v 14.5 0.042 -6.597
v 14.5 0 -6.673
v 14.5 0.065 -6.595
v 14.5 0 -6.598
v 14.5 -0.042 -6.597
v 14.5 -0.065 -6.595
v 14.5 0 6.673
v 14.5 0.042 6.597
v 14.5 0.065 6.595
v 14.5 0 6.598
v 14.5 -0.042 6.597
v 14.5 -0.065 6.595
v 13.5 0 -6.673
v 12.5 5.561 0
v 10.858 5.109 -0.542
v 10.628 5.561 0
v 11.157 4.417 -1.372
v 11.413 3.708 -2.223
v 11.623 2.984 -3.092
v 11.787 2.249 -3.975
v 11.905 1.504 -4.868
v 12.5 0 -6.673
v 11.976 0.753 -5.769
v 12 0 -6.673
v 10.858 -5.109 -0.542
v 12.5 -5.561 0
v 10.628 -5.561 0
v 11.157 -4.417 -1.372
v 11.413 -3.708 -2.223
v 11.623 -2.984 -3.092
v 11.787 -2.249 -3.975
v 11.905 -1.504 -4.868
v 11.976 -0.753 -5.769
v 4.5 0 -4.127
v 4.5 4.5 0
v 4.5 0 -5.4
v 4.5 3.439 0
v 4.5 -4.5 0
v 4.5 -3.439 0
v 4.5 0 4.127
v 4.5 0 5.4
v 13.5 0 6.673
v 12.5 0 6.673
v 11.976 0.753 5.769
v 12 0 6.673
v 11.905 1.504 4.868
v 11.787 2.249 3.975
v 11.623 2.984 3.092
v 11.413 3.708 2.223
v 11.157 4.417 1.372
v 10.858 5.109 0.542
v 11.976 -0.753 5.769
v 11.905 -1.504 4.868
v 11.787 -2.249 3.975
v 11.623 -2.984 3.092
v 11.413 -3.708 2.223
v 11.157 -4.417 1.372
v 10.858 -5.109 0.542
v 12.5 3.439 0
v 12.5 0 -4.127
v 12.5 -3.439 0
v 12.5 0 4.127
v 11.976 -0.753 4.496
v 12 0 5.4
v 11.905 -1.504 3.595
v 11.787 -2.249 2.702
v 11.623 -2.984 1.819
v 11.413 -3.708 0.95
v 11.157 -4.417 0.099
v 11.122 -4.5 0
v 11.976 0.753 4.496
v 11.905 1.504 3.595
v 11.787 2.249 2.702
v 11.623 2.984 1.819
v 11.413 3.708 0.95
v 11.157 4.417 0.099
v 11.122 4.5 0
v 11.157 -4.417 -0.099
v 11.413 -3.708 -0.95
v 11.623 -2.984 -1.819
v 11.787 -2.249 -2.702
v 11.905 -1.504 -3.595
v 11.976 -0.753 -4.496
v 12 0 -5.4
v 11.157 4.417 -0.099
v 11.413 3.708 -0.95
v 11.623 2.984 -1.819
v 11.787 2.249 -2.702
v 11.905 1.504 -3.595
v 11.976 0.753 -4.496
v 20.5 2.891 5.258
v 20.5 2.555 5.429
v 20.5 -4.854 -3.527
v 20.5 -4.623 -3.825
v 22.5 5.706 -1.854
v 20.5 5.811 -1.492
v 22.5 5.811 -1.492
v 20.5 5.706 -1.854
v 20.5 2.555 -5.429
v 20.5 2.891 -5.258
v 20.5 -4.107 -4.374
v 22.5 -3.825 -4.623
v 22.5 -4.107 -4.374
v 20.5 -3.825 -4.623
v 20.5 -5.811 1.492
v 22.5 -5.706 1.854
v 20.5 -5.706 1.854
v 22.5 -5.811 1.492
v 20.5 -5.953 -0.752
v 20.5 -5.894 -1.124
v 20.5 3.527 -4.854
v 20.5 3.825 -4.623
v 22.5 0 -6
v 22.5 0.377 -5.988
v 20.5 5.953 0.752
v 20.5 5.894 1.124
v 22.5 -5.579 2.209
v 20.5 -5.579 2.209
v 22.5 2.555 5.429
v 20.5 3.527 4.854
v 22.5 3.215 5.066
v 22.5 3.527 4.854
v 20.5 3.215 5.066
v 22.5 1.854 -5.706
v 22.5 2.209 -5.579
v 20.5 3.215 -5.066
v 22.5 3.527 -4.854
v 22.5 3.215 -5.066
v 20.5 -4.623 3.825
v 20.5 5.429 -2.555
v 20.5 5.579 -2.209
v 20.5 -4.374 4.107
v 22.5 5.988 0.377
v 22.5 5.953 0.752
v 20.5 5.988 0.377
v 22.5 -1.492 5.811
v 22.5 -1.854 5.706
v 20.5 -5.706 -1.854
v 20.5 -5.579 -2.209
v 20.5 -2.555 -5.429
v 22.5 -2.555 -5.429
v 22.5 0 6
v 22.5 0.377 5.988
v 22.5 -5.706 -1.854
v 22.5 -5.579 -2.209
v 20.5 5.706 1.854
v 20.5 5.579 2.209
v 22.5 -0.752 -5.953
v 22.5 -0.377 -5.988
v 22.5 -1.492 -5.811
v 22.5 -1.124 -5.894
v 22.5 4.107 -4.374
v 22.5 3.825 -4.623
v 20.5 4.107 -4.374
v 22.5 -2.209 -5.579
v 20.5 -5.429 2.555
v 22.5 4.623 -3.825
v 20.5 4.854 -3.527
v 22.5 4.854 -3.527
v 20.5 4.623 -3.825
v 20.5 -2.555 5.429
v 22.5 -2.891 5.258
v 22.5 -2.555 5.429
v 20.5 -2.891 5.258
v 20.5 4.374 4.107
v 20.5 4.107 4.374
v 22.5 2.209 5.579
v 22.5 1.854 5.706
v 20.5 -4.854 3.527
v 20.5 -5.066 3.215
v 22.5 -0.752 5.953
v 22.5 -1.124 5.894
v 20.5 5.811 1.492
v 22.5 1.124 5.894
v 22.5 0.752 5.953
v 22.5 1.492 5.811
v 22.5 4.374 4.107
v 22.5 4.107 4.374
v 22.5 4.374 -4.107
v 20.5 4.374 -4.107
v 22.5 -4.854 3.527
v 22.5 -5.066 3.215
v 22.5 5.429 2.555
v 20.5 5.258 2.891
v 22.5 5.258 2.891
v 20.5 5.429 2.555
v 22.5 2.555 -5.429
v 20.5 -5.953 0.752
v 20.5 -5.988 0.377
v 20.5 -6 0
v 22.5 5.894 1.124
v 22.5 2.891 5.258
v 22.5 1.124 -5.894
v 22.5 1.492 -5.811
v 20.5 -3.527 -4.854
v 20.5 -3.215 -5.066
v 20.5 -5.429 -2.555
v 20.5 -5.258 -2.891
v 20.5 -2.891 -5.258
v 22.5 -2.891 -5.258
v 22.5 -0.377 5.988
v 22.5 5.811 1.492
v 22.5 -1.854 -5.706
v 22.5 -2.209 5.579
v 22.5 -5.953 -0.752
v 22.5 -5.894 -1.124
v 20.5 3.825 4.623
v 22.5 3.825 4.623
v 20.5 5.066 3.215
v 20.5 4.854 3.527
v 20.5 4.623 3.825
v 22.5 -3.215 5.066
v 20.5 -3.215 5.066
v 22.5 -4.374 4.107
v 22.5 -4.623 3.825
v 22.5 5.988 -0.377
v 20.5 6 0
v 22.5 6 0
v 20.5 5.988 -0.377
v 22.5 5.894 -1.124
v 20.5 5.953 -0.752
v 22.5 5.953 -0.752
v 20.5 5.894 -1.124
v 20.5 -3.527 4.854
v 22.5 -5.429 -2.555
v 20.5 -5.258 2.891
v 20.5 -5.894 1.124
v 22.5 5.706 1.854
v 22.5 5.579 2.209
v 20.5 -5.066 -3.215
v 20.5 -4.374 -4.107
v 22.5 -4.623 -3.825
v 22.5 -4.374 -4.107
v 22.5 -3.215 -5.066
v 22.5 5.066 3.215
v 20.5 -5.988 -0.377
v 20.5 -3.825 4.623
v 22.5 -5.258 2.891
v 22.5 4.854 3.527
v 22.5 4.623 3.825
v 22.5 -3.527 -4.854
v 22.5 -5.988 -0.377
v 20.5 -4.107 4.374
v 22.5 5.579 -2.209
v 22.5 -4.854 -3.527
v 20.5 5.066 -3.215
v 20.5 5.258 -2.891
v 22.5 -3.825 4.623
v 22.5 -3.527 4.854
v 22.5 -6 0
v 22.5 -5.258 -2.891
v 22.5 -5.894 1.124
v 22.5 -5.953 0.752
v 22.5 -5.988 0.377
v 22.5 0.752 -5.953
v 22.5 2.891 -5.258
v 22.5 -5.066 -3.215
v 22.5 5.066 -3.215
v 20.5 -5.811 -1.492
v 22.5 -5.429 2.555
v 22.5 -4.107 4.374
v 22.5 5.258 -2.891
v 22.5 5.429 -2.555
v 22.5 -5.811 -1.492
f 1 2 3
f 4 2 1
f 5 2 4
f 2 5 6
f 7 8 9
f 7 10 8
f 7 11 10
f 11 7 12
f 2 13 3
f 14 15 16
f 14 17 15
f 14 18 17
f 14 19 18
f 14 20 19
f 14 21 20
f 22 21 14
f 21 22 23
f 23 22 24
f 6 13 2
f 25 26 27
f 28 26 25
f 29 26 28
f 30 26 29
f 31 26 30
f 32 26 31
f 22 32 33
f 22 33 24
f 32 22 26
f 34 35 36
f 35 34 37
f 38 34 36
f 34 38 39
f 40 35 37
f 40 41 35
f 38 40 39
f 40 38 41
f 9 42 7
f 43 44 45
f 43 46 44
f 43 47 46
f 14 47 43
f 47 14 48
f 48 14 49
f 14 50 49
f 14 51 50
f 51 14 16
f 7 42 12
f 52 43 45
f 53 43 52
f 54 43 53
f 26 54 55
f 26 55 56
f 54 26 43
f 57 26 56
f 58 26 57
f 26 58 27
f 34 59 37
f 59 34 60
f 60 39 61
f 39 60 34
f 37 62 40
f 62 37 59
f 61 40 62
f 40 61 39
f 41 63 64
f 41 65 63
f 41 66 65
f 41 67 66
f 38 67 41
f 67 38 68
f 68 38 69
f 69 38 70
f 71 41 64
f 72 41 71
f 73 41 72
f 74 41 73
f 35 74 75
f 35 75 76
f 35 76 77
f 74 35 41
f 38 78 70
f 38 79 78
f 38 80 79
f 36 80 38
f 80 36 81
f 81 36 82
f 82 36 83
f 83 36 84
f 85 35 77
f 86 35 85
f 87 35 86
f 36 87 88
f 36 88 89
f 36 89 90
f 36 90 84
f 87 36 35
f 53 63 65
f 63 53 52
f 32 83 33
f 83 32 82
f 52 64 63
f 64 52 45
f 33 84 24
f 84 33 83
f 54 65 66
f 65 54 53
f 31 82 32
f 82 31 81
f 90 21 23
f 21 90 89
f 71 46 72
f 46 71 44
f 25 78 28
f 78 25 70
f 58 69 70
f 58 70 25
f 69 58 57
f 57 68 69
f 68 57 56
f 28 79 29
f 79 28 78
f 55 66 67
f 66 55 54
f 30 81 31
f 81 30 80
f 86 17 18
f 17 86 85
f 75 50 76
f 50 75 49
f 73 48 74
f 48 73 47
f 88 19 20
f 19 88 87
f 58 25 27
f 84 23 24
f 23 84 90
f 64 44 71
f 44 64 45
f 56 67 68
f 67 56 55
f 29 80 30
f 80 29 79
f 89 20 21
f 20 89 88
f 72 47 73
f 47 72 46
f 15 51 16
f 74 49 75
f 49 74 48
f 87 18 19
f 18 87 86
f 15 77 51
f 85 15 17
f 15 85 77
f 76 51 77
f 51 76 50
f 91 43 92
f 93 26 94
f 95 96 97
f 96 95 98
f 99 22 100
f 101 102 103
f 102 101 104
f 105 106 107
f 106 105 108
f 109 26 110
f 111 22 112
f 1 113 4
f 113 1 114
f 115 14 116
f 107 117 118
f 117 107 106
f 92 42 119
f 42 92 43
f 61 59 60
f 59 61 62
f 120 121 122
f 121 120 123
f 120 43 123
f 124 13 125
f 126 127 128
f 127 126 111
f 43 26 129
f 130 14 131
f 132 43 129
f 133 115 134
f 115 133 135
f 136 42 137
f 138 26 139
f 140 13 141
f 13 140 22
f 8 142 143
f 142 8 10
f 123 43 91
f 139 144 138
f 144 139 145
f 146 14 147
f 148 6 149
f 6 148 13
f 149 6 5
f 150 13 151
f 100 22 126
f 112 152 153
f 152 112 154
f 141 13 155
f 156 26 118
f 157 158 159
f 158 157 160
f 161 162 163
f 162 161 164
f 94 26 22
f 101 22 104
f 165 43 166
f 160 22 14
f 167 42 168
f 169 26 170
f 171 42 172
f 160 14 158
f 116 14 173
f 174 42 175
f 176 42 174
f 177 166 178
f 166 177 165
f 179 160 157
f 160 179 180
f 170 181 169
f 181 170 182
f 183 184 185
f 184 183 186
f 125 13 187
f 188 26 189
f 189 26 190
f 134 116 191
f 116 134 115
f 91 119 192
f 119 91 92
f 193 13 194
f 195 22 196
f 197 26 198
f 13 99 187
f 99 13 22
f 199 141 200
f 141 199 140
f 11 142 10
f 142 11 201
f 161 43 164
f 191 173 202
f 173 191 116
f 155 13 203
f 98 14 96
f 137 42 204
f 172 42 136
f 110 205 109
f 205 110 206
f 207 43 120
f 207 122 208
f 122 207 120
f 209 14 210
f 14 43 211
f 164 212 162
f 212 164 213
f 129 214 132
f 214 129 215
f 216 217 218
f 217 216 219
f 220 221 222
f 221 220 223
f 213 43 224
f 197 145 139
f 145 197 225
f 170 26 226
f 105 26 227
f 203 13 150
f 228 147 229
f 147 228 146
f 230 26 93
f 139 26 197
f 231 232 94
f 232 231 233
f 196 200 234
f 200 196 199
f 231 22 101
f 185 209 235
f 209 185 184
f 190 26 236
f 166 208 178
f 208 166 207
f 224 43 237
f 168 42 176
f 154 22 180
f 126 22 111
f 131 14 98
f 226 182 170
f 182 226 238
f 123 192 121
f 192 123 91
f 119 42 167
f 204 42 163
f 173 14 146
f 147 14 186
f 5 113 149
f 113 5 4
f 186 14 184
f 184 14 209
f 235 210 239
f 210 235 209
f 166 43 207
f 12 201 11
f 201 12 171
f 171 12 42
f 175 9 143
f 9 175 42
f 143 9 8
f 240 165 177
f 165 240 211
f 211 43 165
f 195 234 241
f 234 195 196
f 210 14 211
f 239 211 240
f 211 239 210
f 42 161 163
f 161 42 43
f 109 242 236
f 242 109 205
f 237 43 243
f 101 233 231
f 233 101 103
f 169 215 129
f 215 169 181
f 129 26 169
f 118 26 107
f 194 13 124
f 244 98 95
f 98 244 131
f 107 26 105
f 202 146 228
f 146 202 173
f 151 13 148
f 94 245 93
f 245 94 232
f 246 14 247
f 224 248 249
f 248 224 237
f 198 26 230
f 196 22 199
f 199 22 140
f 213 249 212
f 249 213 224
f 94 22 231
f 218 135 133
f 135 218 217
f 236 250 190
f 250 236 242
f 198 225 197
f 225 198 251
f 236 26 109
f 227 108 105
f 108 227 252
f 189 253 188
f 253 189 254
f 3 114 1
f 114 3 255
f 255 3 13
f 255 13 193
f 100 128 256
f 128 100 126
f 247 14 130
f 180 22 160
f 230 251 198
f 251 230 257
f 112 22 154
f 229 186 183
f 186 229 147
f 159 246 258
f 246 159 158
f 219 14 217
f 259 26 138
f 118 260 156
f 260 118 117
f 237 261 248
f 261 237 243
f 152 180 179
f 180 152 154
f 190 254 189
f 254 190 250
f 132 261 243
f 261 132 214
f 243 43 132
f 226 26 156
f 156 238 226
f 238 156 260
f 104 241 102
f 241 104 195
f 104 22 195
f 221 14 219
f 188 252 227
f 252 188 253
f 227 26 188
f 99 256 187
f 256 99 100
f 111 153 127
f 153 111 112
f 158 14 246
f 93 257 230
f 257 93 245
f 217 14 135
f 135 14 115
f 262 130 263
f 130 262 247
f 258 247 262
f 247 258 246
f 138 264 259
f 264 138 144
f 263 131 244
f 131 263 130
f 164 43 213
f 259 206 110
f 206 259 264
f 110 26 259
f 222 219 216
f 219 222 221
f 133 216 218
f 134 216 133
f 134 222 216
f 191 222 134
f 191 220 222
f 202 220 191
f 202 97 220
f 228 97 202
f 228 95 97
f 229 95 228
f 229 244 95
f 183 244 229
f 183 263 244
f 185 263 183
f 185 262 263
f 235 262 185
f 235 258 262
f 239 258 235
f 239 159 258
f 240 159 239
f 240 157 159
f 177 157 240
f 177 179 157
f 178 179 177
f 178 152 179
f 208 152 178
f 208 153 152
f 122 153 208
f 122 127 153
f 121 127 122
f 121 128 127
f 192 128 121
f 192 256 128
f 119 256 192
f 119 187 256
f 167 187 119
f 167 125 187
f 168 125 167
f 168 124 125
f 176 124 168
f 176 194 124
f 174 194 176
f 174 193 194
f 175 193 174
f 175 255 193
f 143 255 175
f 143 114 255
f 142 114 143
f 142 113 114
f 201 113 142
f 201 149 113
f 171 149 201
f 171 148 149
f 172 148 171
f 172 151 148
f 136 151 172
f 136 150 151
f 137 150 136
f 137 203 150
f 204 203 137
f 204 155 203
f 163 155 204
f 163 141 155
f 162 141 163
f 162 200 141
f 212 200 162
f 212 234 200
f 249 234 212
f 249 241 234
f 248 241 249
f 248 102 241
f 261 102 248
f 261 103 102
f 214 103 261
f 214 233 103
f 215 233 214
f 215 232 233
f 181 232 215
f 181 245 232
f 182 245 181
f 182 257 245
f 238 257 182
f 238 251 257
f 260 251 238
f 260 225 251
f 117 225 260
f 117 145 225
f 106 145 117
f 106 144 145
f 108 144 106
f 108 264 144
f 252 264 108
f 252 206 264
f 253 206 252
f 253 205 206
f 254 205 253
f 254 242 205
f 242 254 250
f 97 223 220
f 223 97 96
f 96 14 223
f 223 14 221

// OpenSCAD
//Variabels
res=100;

gum_h=6;
gum_r=18/2;

output_r=7;

cube_l=30;

capsule_top=9/2;
capsule_bottom=18;
capsule_rest=16;

screw_r=1.4;

margin=3;

h1=cube_l/2+5;
d1=sqrt(capsule_top*capsule_top*2);
h2=10;

//Modules
module screw_hole() {
	cylinder(r=screw_r,h=10,center=true,$fn=res);
	translate([0,0,7.5])cylinder(r1=screw_r,r2=screw_r*1.2,h=5,center=true,$fn=res);
}
module gum() {
	cylinder(r=gum_r,h=gum_h,center=true,$fn=res);
}
module cut() {
	translate([0,0,-cube_l/2+gum_h/2])gum();
	translate([0,0,-cube_l/2+(capsule_rest-4)])cylinder(r=capsule_top,h=capsule_rest+2,center=true,$fn=res);
	translate([0,0,5])screw_hole();
	scale(v=[1,1,1.2])rotate(a=[180,0,0]){rotate(a=[0,90,0])rotate(a=[0,0,45])translate([0,0,h1/2+1])cube([d1,d1,h1],center=true);
}

}
module body() {
	cylinder(r=capsule_bottom/2+margin,h=30,center=true,$fn=res);
}
module complete() {
	rotate(a=[180,0,0])difference() {
		body();
		cut();
	}
}
module pipe() {
difference() {
scale(v=[1,1,1.2])rotate(a=[180,0,0]){rotate(a=[0,90,0])rotate(a=[0,0,45])translate([0,0,h2/2+capsule_top])cube([d1+margin/2,d1+margin/2,h2],center=true);}
scale(v=[1,1,1.2])rotate(a=[180,0,0]){rotate(a=[0,90,0])rotate(a=[0,0,45])translate([0,0,h2/2+capsule_top])cube([d1-margin/2,d1-margin/2,h2],center=true);}
}
}
module jet_b() {
	translate([0,0,-1.5])cylinder(r=capsule_top+margin/2,h=2,center=true,$fn=res);
	cylinder(r=capsule_top,h=5,center=true,$fn=res);
}
module jet_c() {
	difference() {
		jet_b();
		cylinder(r=capsule_top-margin/2,h=5,center=true,$fn=res);
	}
}
module jet_a() {
	difference(){
		pipe();
		complete();
	}
}
module jet_d() {
	hull(){
		translate([20,0,0])rotate(a=[0,-90,0])jet_c();
		jet_e();
	}
}
module jet_e() {
	intersection() {
		translate([13,0,0])cube([1,20,20],center=true);
		jet_a();
	}
}
difference() {jet_d();jet_c();}
jet_a();
